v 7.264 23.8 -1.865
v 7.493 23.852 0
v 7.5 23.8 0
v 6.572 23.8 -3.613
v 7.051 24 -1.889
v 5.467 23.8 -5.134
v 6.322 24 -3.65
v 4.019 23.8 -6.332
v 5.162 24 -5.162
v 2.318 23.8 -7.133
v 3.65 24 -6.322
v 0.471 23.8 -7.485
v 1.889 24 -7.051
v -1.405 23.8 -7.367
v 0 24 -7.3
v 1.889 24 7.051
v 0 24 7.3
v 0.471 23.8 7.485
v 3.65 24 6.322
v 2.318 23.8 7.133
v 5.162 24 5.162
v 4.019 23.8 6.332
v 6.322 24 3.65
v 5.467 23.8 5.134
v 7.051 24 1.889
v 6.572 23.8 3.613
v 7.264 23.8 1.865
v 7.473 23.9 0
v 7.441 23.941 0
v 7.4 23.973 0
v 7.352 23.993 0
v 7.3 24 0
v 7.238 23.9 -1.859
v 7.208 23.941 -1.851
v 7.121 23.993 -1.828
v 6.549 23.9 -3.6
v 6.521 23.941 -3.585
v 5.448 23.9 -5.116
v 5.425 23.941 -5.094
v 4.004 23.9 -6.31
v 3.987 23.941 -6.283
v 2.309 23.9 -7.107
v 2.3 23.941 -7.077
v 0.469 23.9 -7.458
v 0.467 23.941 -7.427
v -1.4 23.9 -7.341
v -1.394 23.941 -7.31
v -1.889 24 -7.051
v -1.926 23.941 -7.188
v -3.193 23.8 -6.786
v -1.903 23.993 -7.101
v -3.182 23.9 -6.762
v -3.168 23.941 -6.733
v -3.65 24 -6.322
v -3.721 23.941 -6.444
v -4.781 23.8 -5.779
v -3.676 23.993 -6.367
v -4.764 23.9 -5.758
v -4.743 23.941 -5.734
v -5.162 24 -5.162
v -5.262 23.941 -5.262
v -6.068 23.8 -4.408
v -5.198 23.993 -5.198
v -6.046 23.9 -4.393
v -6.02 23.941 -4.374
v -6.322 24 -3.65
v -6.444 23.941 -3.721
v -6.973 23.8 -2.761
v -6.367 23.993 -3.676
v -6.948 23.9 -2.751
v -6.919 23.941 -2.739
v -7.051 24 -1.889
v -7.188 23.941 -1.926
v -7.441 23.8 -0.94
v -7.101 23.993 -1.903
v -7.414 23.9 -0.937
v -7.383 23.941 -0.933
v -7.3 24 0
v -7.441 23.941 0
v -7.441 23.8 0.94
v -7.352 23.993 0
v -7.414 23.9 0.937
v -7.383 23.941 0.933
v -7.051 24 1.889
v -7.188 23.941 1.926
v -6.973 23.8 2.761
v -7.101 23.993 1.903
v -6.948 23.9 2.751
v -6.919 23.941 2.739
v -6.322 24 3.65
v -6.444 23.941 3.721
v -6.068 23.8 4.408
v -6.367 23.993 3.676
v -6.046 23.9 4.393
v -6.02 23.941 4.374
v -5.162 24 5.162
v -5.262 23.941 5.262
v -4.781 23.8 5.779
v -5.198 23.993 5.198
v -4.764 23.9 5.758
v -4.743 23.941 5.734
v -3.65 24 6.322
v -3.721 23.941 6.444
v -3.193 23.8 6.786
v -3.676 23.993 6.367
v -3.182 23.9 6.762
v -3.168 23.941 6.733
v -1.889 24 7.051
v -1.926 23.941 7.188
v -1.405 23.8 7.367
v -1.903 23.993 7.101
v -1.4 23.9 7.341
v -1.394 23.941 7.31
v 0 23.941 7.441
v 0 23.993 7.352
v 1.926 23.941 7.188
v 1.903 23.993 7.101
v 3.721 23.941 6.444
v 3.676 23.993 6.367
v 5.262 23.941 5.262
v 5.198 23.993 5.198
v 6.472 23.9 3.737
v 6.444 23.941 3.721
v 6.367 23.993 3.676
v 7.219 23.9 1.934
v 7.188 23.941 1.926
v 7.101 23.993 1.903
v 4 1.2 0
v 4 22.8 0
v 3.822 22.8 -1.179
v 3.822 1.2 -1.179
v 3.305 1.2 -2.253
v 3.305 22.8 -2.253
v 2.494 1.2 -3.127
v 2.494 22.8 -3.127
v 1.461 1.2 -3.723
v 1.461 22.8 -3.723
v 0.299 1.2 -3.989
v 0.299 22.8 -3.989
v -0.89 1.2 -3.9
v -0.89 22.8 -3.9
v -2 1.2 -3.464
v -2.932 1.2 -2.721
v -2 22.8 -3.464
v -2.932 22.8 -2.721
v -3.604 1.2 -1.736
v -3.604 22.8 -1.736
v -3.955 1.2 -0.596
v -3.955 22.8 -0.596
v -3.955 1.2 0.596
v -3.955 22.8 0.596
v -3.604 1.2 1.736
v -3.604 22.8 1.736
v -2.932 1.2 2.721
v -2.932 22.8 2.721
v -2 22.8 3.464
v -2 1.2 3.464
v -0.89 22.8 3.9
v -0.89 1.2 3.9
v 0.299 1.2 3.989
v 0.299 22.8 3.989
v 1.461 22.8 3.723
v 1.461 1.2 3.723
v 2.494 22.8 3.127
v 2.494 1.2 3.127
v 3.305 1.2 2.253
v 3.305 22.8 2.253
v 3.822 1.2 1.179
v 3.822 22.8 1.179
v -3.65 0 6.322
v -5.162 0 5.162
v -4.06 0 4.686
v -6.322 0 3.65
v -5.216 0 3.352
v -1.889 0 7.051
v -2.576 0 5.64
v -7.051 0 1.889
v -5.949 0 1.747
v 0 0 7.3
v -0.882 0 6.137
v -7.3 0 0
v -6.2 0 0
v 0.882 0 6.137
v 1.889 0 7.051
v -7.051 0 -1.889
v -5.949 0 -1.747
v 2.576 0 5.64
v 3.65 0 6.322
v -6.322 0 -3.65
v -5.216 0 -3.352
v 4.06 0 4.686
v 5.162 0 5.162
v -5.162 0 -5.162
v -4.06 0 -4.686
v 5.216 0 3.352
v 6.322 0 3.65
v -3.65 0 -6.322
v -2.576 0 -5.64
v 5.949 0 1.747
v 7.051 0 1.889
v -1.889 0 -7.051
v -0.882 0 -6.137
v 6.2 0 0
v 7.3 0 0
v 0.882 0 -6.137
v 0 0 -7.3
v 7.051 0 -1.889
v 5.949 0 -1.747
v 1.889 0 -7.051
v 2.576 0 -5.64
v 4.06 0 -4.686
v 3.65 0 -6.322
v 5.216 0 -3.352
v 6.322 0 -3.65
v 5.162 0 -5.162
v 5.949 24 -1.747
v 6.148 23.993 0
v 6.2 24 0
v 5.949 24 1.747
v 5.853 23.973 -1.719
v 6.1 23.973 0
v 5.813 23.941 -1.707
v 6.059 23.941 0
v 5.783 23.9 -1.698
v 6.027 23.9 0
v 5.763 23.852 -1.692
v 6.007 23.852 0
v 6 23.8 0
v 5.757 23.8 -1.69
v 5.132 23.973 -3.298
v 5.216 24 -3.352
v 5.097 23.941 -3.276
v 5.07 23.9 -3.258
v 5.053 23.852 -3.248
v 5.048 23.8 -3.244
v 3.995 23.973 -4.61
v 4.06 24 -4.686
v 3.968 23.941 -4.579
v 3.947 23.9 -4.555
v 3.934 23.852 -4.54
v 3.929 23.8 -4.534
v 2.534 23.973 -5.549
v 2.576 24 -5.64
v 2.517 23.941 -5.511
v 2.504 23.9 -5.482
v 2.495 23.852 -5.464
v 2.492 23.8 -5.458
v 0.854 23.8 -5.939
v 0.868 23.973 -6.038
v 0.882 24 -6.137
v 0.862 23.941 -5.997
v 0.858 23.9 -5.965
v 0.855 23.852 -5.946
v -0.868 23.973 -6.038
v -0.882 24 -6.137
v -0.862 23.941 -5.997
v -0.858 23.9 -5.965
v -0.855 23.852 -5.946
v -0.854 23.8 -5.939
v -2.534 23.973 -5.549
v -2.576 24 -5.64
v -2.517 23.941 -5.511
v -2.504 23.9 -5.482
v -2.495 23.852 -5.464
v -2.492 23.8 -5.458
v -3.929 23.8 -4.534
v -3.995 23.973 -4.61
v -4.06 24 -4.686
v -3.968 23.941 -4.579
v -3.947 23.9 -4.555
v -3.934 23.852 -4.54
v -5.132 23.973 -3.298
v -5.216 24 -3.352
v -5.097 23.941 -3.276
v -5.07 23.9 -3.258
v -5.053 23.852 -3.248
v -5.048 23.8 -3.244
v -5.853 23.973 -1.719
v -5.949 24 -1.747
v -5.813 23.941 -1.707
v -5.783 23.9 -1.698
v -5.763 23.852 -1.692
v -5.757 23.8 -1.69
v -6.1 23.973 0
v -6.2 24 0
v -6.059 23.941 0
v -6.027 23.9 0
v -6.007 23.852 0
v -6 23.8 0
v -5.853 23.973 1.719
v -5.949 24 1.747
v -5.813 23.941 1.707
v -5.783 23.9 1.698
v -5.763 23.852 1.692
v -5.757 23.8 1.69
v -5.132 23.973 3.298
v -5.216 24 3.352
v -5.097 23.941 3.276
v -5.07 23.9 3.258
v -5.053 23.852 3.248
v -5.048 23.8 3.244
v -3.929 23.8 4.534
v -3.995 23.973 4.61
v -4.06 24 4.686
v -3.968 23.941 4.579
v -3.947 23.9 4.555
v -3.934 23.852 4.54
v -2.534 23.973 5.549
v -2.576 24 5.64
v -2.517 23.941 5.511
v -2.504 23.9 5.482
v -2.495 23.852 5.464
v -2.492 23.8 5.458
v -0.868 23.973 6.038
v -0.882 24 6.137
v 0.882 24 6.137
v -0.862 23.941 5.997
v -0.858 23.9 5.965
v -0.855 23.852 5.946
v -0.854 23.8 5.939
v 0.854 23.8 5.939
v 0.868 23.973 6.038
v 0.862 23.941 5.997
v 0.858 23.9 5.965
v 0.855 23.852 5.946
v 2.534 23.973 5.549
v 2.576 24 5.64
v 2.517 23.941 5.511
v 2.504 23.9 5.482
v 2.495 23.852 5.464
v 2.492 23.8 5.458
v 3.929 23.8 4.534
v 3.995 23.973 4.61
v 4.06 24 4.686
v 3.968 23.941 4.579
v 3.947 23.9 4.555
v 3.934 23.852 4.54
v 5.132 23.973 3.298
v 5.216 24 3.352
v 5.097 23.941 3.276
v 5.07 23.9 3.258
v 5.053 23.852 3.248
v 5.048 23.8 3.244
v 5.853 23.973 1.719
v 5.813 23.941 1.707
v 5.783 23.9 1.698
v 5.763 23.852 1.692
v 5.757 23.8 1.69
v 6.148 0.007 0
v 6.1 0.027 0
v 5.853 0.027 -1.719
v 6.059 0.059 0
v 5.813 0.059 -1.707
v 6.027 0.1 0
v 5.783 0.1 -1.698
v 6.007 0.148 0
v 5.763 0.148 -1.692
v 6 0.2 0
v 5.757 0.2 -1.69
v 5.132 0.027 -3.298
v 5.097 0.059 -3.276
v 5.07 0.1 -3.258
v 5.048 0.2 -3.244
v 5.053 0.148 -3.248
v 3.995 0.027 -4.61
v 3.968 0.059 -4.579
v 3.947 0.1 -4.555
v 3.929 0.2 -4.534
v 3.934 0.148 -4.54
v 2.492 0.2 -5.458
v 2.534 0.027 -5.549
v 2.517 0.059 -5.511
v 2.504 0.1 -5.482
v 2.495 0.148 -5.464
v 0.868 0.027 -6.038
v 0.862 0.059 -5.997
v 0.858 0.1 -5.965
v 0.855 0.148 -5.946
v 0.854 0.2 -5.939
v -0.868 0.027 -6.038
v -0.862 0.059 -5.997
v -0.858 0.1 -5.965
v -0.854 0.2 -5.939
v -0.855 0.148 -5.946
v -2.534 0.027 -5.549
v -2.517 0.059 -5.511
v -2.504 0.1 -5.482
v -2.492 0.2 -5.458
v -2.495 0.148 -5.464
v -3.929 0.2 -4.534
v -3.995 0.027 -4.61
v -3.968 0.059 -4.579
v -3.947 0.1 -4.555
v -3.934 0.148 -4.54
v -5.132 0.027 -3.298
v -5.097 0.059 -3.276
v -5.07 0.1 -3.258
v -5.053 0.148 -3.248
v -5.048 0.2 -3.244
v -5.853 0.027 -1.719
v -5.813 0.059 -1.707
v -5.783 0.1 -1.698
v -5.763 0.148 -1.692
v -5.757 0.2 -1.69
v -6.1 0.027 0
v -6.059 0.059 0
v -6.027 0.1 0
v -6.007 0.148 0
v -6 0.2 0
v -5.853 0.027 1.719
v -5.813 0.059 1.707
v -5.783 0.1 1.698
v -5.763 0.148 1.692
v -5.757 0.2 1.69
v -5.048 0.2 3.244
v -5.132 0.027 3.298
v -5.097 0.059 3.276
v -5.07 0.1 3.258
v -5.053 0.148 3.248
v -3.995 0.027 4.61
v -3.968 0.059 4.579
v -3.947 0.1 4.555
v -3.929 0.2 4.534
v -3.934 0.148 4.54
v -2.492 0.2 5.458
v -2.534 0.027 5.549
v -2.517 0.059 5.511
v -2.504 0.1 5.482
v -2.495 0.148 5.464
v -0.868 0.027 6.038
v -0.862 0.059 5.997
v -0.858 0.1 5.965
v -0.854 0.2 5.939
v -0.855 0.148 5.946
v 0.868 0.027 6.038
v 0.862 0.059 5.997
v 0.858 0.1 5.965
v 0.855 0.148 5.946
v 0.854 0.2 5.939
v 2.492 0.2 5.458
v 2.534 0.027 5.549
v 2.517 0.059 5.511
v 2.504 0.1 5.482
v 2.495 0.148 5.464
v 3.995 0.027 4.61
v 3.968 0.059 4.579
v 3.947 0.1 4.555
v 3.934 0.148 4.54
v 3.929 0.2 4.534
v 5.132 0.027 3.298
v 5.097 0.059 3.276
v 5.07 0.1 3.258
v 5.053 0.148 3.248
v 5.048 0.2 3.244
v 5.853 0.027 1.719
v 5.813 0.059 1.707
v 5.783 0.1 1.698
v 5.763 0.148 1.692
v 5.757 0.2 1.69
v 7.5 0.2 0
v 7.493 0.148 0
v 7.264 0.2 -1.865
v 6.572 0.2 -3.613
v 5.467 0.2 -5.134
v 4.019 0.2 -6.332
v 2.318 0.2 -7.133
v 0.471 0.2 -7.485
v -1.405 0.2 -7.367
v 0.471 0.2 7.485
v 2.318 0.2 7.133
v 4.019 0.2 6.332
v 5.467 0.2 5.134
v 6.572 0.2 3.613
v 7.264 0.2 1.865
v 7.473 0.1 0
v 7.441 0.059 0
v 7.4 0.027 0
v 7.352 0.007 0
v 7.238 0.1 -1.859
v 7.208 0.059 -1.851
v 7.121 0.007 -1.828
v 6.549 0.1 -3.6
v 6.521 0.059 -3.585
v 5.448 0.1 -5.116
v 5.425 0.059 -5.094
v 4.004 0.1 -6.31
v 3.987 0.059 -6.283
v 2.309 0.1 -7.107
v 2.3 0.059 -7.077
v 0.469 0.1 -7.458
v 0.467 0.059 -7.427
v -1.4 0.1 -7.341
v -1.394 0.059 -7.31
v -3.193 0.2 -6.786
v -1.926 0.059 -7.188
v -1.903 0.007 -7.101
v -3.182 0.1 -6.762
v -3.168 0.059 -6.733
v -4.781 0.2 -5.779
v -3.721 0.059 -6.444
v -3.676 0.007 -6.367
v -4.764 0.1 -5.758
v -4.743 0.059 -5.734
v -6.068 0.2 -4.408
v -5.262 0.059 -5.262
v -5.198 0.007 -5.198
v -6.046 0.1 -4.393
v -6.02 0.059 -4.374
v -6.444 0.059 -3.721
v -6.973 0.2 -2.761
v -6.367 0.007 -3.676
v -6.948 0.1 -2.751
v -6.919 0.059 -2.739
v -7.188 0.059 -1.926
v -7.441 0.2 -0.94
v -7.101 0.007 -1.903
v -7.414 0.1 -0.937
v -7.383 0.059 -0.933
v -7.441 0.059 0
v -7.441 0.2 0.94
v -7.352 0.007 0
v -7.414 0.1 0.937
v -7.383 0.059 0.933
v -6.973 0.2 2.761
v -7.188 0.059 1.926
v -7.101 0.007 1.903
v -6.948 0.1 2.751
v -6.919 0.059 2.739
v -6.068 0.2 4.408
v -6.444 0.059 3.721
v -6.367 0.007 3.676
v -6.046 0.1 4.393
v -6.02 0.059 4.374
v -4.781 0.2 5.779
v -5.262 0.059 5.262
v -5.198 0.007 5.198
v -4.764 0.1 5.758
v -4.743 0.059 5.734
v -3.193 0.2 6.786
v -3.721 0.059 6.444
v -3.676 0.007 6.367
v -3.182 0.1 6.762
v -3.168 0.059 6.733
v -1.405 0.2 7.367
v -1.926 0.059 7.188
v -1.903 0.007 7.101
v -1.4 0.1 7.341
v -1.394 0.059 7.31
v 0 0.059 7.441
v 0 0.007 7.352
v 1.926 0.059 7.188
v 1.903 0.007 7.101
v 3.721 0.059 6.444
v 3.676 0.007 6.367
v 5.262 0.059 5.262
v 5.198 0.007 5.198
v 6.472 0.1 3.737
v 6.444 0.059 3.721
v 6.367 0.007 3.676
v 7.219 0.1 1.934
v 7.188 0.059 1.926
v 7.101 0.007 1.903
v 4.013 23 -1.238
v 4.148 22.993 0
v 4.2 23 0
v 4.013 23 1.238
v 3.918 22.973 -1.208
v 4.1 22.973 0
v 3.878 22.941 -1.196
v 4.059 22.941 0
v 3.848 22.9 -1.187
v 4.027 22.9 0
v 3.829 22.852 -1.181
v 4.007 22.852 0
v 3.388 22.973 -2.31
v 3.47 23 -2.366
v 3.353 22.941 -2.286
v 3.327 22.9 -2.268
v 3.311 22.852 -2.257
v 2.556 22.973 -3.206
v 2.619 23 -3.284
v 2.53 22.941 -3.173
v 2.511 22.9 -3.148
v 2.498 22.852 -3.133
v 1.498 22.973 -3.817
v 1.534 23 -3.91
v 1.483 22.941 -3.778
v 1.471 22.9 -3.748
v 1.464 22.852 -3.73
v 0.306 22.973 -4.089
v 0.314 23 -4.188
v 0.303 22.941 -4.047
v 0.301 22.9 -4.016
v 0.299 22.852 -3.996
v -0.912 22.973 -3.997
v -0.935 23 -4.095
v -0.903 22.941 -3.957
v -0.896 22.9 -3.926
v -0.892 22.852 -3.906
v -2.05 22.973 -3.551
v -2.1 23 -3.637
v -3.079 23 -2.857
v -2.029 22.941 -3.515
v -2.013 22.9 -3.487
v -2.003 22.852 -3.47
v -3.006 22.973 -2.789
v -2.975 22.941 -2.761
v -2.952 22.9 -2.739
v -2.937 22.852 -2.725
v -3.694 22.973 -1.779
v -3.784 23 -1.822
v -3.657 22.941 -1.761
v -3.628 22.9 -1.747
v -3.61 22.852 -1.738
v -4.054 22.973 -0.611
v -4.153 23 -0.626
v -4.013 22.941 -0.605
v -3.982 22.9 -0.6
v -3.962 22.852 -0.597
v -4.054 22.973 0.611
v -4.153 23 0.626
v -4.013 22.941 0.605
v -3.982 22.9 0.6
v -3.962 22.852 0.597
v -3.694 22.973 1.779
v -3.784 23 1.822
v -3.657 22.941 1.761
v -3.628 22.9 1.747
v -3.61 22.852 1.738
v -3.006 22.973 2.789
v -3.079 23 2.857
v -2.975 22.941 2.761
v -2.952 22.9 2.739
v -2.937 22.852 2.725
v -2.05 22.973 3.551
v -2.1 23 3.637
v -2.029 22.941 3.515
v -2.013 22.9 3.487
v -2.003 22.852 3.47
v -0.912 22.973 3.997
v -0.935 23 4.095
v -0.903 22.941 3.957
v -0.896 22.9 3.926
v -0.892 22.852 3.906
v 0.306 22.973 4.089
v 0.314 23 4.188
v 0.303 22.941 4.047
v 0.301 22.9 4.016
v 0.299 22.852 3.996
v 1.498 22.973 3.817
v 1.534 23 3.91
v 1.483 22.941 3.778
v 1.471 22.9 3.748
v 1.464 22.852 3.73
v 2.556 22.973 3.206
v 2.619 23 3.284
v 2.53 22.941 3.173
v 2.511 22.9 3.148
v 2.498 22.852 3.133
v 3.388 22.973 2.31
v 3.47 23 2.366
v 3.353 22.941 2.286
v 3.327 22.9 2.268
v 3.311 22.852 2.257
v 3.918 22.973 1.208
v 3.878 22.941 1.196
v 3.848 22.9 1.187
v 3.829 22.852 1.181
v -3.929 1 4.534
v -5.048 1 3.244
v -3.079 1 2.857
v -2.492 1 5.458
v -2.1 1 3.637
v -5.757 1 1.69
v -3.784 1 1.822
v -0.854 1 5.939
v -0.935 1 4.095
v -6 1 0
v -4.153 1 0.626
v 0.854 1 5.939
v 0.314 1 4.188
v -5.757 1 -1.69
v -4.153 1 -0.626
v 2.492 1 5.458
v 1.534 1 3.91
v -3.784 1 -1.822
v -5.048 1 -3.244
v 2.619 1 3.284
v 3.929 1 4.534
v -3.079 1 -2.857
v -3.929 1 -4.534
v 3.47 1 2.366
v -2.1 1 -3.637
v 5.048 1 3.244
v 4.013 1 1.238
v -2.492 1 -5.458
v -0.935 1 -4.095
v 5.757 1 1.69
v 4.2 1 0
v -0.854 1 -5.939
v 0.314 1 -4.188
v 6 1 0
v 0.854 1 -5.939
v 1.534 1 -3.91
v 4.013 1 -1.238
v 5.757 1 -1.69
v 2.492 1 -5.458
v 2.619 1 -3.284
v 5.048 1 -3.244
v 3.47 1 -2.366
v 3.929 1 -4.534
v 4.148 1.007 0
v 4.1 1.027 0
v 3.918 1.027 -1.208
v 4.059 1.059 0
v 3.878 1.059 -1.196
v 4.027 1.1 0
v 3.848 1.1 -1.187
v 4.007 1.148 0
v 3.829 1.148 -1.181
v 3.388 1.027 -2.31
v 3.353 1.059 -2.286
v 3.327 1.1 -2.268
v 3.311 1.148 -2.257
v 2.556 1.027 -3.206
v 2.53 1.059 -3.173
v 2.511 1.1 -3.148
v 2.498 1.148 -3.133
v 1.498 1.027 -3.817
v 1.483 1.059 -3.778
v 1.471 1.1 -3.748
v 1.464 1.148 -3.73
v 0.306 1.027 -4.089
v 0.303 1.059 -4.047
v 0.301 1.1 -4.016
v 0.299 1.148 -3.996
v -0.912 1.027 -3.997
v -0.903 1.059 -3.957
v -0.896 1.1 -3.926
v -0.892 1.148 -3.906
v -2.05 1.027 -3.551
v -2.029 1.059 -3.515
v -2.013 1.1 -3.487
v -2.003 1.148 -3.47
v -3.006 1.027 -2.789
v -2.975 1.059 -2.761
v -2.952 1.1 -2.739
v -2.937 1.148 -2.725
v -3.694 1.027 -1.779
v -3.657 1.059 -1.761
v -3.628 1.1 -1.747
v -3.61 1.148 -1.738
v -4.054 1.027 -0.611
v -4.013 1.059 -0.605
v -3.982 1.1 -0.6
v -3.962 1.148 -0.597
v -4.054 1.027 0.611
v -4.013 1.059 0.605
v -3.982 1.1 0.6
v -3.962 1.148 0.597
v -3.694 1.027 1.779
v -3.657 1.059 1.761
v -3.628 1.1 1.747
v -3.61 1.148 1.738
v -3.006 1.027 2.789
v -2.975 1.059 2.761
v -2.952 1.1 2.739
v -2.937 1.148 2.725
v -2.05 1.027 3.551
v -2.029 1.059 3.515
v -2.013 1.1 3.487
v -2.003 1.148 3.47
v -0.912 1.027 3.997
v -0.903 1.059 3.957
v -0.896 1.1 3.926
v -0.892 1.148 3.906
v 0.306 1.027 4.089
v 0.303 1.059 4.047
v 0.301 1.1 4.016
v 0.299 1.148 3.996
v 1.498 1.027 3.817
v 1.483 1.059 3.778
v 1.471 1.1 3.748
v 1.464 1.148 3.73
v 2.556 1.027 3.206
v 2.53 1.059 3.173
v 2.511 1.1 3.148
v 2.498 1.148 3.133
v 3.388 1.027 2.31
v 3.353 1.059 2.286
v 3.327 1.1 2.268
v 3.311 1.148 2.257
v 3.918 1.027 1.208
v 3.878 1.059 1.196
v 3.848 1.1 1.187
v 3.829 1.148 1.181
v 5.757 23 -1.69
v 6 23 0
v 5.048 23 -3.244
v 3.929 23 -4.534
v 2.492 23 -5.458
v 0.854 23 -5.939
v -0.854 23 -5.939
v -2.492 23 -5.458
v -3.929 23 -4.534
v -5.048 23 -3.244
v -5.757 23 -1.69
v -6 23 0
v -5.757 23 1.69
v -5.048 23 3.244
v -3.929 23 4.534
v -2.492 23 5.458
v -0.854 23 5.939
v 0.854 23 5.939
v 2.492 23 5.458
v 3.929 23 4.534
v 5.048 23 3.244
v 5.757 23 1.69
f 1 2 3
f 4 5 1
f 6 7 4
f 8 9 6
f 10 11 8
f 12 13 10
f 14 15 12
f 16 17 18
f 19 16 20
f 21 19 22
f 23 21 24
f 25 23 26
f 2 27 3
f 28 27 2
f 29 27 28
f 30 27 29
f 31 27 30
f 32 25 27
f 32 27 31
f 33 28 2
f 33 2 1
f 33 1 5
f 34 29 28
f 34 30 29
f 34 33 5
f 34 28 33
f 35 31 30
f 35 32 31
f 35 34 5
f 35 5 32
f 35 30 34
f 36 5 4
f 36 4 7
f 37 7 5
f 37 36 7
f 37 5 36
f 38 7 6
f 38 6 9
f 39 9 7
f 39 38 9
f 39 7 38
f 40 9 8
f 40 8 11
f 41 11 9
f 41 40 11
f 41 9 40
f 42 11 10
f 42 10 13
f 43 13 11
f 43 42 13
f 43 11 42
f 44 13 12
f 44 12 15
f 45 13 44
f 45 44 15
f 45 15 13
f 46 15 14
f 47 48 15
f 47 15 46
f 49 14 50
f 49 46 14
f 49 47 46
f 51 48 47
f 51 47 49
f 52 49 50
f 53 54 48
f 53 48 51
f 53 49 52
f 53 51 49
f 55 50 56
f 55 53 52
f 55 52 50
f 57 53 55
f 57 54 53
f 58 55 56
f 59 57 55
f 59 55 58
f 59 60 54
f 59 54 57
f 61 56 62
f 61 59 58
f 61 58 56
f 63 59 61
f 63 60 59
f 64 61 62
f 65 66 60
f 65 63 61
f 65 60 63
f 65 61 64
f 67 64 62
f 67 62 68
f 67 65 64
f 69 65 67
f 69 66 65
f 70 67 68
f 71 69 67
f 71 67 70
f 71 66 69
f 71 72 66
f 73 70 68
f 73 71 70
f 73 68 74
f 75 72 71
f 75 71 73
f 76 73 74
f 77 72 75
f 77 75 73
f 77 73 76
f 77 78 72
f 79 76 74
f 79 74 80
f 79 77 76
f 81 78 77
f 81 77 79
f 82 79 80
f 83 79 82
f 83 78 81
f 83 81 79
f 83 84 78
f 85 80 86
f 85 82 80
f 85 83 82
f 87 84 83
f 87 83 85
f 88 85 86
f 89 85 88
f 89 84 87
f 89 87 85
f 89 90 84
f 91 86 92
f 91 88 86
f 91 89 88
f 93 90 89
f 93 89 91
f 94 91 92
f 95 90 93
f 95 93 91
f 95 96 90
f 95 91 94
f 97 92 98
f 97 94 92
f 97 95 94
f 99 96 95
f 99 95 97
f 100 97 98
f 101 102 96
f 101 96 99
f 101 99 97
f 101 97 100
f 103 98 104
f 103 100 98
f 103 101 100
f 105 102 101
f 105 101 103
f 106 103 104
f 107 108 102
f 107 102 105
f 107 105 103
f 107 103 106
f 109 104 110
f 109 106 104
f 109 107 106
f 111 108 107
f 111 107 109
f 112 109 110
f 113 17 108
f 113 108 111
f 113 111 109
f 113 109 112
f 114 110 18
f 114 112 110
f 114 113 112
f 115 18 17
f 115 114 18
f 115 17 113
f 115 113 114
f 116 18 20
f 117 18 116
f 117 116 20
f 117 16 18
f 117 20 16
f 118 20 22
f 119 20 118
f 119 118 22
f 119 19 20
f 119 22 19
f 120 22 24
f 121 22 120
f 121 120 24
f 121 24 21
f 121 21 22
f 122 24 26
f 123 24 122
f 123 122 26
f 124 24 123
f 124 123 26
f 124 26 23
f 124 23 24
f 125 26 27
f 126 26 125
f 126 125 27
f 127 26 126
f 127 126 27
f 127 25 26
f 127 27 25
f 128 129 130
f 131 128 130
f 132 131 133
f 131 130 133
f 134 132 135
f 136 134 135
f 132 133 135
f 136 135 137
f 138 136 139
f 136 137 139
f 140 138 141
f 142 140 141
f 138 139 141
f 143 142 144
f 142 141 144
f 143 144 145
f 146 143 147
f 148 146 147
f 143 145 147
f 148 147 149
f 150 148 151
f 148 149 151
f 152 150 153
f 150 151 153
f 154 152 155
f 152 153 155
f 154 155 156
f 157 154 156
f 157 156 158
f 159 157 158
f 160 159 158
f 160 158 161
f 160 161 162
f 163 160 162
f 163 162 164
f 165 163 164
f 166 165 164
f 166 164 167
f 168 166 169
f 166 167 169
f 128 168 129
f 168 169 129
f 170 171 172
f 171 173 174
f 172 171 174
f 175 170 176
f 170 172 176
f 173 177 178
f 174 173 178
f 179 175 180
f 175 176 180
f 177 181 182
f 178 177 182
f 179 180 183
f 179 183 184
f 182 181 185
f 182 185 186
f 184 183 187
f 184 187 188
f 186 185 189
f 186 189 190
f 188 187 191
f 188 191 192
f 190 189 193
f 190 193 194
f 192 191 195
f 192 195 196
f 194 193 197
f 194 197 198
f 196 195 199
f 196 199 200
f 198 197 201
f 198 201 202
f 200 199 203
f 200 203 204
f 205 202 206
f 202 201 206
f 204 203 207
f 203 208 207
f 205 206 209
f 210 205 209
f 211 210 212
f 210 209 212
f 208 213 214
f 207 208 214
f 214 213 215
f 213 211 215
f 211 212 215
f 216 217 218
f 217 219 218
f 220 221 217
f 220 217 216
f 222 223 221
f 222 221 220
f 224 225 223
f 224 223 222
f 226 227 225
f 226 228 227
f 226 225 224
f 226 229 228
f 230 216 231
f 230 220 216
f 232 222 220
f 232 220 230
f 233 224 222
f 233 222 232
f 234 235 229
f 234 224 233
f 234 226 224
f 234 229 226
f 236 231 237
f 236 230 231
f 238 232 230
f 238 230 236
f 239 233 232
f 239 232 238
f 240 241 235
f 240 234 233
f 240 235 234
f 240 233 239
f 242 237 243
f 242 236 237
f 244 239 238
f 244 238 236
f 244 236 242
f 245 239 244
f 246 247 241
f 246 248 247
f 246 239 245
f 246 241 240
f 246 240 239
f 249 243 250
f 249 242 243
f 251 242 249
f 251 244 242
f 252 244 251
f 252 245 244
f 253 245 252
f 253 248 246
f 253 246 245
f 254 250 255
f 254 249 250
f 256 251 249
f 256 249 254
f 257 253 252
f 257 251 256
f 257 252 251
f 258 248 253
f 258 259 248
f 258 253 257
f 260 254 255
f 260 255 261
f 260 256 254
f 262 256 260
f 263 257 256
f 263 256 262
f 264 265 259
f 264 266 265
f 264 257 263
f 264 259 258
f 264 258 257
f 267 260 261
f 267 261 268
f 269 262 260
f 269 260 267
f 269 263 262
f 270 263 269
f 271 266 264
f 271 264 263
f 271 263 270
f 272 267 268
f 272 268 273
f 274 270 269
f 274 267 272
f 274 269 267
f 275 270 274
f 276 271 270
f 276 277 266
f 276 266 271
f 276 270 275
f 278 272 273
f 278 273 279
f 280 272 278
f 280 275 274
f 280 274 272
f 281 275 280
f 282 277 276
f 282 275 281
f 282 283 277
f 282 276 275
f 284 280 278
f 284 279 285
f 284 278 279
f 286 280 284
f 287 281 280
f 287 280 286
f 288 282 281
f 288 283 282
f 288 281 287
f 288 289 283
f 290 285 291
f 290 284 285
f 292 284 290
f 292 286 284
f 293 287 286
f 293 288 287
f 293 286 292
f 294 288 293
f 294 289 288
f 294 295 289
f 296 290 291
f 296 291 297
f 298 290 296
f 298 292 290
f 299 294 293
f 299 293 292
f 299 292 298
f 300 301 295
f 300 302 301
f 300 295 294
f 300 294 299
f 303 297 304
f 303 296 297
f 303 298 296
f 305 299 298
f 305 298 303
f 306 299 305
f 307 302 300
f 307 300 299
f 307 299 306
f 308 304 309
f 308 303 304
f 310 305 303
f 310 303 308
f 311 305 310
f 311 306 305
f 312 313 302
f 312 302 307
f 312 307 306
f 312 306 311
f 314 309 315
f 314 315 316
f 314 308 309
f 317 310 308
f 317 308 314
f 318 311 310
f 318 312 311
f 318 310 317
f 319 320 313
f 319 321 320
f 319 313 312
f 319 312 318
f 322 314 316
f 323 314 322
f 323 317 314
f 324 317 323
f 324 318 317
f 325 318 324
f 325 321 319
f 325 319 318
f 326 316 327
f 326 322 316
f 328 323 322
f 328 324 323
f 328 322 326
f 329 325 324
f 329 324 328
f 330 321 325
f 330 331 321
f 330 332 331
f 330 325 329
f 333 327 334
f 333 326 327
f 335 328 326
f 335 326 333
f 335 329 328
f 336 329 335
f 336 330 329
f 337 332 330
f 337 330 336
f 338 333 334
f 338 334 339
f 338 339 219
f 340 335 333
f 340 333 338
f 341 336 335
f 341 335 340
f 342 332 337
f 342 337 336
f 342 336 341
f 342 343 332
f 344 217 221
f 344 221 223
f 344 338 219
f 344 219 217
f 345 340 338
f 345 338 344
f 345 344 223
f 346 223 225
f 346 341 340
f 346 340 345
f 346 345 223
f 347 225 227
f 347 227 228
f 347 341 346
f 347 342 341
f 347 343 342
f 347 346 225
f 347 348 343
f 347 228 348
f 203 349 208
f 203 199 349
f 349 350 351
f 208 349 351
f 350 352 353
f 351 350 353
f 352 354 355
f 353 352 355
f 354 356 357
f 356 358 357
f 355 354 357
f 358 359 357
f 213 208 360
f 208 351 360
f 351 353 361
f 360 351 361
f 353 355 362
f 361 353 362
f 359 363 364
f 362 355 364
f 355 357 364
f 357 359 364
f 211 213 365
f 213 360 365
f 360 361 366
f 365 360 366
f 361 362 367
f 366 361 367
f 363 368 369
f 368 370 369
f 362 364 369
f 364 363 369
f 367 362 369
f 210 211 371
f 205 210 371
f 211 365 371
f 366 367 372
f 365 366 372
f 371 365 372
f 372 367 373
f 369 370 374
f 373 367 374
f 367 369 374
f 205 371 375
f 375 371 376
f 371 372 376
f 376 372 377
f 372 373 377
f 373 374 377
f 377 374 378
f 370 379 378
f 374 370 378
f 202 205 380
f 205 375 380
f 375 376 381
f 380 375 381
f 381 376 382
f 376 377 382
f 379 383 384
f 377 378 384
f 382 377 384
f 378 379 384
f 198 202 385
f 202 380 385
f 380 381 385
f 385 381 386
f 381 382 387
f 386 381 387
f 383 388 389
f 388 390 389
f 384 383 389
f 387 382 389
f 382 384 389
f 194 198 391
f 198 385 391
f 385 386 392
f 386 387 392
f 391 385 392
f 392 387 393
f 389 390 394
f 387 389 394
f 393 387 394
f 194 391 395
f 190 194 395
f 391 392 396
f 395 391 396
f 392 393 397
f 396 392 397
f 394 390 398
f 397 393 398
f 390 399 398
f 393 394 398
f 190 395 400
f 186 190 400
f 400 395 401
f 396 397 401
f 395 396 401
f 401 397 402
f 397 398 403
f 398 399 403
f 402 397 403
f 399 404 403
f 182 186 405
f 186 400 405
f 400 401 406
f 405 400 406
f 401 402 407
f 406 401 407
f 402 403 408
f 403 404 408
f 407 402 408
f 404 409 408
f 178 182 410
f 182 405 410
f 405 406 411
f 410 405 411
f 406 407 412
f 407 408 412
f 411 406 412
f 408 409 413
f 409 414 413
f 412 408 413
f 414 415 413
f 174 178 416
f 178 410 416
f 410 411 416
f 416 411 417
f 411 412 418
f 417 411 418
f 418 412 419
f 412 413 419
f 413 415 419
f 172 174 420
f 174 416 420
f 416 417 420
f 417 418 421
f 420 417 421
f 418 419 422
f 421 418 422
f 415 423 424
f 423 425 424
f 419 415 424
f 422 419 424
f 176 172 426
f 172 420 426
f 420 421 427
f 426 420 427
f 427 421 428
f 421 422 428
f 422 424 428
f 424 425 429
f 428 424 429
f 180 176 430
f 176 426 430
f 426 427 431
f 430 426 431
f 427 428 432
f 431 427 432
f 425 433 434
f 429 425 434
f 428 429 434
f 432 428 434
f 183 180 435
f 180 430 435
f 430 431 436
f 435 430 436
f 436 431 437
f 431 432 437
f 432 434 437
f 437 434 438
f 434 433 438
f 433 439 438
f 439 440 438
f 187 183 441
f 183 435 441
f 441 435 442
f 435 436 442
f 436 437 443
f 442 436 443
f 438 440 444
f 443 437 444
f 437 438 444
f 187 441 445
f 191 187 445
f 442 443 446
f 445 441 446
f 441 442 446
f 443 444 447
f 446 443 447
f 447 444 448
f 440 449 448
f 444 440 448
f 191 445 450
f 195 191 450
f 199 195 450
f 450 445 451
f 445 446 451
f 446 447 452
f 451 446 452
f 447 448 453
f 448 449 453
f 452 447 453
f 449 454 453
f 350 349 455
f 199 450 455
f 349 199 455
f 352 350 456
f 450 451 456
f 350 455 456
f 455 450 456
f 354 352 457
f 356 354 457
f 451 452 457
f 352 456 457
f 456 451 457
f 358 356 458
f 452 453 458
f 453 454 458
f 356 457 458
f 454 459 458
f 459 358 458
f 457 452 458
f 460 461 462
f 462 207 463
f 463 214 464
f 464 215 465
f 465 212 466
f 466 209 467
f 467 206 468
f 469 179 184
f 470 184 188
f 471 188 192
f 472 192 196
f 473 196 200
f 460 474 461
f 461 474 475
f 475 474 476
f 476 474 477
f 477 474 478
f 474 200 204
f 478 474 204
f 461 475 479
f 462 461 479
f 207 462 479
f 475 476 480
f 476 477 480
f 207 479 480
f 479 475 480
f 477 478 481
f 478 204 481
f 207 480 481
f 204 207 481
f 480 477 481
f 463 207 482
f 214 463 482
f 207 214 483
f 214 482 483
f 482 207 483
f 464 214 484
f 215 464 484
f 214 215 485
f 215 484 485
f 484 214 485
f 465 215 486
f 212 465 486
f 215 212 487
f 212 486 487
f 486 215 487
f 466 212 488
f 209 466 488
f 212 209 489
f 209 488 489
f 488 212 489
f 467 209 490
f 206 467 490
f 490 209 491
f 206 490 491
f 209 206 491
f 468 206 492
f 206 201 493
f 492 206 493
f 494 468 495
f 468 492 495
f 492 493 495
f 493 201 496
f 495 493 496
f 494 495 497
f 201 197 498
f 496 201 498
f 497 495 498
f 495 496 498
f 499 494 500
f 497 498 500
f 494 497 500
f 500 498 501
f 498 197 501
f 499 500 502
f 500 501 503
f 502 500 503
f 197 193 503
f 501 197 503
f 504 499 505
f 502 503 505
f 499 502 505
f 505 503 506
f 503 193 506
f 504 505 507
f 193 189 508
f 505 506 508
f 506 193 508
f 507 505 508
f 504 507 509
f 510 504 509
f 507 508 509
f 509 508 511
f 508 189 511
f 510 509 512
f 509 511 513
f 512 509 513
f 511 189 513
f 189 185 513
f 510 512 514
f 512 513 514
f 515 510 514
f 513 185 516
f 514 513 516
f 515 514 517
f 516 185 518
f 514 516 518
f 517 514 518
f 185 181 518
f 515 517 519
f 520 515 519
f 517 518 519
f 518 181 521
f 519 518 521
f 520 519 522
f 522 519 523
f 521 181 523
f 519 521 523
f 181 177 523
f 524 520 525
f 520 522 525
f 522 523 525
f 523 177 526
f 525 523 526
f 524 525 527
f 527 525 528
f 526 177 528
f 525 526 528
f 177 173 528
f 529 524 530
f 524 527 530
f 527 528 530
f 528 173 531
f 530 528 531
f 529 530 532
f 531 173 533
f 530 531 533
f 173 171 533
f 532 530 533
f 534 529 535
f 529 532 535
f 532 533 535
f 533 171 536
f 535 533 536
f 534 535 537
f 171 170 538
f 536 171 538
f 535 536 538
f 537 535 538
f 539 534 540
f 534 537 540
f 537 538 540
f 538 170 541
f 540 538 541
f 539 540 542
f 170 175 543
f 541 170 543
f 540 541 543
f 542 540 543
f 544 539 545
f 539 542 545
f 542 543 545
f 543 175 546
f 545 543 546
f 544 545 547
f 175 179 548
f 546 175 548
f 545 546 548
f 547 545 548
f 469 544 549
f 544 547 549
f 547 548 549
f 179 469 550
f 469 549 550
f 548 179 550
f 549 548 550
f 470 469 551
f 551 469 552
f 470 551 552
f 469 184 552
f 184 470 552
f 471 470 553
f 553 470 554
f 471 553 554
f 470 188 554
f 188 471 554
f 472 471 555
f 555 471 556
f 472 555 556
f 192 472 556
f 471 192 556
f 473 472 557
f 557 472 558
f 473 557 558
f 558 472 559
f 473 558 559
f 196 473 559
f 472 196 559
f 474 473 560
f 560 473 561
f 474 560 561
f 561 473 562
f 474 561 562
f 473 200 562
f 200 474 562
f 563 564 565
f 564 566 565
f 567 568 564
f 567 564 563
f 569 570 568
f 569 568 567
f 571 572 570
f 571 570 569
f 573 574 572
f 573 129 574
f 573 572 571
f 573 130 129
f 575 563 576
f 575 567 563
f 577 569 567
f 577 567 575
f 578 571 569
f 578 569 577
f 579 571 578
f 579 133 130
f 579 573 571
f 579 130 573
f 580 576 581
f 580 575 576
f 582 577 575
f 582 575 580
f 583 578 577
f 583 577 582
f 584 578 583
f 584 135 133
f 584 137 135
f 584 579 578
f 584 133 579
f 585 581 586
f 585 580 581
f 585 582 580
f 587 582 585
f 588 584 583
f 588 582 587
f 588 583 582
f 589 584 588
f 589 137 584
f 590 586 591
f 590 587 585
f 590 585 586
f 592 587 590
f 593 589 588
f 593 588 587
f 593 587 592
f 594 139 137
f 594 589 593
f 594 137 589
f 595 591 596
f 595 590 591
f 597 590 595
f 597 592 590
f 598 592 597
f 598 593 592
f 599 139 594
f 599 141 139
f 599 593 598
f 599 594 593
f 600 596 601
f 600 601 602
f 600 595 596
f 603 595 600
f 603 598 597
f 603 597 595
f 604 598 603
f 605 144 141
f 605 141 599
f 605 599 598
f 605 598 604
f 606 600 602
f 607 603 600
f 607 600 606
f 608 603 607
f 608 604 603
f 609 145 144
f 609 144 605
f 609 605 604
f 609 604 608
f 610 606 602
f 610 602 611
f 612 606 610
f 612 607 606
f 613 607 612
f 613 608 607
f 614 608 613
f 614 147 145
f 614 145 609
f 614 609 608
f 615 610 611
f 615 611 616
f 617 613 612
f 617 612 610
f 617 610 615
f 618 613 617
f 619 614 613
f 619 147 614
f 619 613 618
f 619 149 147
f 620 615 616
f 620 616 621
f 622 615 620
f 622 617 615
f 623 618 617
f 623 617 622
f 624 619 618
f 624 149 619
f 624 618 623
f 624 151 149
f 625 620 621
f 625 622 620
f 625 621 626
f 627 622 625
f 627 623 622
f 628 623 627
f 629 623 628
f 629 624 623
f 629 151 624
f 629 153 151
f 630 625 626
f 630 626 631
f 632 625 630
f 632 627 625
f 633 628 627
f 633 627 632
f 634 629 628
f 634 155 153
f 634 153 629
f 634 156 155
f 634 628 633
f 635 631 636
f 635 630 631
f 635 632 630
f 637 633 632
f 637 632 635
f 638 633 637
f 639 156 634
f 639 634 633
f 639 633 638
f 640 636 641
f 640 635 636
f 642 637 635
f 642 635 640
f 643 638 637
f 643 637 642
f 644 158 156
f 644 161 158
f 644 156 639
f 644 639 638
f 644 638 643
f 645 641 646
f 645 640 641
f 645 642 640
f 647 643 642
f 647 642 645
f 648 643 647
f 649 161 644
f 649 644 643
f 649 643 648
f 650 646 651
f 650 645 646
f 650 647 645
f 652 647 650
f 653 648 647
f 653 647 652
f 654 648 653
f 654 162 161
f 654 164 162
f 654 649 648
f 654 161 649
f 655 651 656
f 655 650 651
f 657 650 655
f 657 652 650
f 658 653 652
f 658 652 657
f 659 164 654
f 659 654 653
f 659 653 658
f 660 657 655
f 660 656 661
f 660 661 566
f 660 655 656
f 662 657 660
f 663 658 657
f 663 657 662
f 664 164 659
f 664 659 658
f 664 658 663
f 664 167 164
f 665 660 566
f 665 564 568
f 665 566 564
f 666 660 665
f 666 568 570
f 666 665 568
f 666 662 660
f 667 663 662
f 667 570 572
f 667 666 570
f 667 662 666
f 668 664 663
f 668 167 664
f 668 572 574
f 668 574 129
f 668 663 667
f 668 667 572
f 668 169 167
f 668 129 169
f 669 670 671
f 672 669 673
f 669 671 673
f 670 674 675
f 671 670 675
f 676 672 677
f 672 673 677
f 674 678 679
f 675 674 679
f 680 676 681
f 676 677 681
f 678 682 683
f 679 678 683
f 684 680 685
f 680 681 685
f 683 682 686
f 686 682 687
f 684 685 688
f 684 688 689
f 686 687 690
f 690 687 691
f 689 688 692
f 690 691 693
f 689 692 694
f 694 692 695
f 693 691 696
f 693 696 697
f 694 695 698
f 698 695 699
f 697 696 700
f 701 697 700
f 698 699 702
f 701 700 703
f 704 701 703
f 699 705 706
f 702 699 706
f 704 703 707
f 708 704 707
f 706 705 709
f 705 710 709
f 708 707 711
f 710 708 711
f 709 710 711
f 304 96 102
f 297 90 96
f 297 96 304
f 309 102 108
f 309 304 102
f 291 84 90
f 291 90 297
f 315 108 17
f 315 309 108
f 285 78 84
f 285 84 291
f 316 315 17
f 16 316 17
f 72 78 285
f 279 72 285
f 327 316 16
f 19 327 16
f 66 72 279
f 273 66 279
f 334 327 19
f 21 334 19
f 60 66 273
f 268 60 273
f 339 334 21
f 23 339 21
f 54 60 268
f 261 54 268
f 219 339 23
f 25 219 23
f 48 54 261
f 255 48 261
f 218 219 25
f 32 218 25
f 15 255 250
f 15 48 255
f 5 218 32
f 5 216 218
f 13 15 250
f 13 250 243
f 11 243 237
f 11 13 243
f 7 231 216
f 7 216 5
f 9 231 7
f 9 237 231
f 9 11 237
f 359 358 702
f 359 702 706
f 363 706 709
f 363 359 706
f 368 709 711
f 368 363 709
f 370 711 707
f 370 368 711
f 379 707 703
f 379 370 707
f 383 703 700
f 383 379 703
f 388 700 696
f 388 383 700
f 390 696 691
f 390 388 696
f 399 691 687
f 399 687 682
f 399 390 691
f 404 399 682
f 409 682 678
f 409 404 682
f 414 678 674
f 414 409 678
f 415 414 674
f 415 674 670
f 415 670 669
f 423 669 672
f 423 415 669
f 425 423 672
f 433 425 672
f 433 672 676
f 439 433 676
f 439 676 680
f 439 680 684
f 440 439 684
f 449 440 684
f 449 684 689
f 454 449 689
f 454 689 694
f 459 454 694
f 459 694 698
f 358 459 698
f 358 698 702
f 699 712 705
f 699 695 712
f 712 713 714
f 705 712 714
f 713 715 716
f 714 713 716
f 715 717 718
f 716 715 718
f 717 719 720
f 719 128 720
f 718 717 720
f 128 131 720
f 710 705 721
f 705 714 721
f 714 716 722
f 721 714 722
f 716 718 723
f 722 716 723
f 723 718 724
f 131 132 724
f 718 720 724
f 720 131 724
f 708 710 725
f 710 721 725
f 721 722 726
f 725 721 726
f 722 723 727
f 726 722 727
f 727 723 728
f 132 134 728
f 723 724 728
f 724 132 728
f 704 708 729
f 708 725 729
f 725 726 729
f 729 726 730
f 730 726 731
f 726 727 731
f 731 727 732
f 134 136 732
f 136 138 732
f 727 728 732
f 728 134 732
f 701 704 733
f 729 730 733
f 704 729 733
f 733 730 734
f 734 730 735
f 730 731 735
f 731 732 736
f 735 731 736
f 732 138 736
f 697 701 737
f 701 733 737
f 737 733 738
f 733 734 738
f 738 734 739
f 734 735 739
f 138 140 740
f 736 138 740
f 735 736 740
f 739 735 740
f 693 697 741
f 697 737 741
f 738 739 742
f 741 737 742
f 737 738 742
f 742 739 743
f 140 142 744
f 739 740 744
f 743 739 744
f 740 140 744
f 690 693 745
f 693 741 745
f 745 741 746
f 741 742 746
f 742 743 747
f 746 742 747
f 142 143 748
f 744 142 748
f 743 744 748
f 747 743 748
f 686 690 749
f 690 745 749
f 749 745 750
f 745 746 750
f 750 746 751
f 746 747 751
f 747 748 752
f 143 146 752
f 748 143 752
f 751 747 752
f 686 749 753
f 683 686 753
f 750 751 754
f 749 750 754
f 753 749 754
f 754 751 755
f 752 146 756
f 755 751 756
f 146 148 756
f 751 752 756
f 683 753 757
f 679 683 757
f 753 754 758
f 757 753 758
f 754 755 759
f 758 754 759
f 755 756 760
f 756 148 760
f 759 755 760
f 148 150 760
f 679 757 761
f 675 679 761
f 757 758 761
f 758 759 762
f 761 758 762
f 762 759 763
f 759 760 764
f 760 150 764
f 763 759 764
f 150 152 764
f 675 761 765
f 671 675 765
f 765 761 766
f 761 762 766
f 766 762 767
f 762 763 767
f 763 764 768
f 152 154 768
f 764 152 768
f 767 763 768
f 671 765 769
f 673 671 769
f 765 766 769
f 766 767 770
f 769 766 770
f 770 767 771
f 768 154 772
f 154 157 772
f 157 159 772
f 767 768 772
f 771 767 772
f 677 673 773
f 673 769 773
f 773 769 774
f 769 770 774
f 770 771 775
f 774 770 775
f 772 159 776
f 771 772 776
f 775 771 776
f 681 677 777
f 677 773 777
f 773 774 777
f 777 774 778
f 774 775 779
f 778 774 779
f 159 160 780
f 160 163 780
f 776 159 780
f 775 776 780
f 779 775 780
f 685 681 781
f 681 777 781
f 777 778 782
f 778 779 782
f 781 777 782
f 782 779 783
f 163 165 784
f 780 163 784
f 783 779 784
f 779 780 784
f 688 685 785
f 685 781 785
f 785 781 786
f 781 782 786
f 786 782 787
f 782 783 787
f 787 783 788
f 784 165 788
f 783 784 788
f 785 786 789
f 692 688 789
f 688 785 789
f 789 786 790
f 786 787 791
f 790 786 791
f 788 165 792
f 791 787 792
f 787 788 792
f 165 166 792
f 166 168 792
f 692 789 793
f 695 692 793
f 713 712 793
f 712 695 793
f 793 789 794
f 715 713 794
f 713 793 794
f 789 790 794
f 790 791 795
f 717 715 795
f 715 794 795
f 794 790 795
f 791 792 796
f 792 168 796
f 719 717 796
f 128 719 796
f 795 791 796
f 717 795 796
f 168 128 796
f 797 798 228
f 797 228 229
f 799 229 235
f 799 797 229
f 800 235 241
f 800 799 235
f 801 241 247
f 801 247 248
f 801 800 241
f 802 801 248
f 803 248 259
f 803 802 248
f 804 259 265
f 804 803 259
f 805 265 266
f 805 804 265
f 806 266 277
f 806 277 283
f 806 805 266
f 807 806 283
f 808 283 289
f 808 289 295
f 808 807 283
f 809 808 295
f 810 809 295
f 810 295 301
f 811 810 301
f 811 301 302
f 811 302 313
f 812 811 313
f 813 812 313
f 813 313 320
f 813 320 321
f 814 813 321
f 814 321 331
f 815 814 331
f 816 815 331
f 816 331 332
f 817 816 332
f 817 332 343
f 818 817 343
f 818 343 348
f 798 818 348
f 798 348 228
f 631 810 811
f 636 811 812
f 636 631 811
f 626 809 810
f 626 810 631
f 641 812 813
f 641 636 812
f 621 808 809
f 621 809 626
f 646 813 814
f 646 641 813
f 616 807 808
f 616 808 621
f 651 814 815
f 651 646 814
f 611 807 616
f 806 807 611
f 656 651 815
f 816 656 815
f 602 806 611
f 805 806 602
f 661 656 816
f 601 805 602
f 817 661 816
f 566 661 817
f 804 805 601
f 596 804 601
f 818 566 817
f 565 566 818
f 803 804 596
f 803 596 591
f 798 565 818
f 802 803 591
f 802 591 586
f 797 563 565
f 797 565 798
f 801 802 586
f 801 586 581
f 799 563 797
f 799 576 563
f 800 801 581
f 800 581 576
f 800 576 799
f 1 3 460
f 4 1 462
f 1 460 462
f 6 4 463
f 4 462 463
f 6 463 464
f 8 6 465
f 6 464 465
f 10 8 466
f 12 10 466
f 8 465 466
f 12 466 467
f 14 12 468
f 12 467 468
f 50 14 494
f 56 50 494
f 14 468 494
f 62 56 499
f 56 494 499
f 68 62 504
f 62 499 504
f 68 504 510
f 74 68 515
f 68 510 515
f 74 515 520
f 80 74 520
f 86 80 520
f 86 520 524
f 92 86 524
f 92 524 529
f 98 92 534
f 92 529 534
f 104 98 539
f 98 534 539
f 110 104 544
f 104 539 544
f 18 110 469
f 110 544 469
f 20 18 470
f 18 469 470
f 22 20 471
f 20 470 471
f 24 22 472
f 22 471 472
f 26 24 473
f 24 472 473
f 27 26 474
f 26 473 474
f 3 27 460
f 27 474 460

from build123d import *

# Parameters (mm, degrees)
SKETCH1_R           = 7.5
SKETCH1_R_2         = 6
BOSS_EXTRUDE1_DEPTH = 24
SKETCH2_R           = 6
SKETCH2_R_2         = 4
BOSS_EXTRUDE2_DEPTH = 22
FILLET1_R           = 0.2


with BuildPart() as part:
    # Sketch1 → Boss-Extrude1 (new body)
    with BuildSketch(Plane(origin=(0, 0, 0), x_dir=(1, 0, 0), z_dir=(0, 1, 0))):
        Circle(SKETCH1_R)
        Circle(SKETCH1_R_2, mode=Mode.SUBTRACT)
    extrude(amount=BOSS_EXTRUDE1_DEPTH)

    # Sketch2 → Boss-Extrude2 (add)
    with BuildSketch(Plane(origin=(0, 23, 0), x_dir=(1, 0, 0), z_dir=(0, 1, 0))):
        Circle(SKETCH2_R)
        Circle(SKETCH2_R_2, mode=Mode.SUBTRACT)
    extrude(amount=-BOSS_EXTRUDE2_DEPTH)

    # Fillet1
    fillet1_edges = [part.edges().sort_by_distance(p)[0] for p in [
        (-4, 1, 0),
        (-4, 23, 0),
        (-7.5, 0, 0),
        (-7.5, 24, 0),
        (-6, 0, 0),
        (-6, 24, 0),
    ]]
    fillet(fillet1_edges, radius=FILLET1_R)


solid = part.part
